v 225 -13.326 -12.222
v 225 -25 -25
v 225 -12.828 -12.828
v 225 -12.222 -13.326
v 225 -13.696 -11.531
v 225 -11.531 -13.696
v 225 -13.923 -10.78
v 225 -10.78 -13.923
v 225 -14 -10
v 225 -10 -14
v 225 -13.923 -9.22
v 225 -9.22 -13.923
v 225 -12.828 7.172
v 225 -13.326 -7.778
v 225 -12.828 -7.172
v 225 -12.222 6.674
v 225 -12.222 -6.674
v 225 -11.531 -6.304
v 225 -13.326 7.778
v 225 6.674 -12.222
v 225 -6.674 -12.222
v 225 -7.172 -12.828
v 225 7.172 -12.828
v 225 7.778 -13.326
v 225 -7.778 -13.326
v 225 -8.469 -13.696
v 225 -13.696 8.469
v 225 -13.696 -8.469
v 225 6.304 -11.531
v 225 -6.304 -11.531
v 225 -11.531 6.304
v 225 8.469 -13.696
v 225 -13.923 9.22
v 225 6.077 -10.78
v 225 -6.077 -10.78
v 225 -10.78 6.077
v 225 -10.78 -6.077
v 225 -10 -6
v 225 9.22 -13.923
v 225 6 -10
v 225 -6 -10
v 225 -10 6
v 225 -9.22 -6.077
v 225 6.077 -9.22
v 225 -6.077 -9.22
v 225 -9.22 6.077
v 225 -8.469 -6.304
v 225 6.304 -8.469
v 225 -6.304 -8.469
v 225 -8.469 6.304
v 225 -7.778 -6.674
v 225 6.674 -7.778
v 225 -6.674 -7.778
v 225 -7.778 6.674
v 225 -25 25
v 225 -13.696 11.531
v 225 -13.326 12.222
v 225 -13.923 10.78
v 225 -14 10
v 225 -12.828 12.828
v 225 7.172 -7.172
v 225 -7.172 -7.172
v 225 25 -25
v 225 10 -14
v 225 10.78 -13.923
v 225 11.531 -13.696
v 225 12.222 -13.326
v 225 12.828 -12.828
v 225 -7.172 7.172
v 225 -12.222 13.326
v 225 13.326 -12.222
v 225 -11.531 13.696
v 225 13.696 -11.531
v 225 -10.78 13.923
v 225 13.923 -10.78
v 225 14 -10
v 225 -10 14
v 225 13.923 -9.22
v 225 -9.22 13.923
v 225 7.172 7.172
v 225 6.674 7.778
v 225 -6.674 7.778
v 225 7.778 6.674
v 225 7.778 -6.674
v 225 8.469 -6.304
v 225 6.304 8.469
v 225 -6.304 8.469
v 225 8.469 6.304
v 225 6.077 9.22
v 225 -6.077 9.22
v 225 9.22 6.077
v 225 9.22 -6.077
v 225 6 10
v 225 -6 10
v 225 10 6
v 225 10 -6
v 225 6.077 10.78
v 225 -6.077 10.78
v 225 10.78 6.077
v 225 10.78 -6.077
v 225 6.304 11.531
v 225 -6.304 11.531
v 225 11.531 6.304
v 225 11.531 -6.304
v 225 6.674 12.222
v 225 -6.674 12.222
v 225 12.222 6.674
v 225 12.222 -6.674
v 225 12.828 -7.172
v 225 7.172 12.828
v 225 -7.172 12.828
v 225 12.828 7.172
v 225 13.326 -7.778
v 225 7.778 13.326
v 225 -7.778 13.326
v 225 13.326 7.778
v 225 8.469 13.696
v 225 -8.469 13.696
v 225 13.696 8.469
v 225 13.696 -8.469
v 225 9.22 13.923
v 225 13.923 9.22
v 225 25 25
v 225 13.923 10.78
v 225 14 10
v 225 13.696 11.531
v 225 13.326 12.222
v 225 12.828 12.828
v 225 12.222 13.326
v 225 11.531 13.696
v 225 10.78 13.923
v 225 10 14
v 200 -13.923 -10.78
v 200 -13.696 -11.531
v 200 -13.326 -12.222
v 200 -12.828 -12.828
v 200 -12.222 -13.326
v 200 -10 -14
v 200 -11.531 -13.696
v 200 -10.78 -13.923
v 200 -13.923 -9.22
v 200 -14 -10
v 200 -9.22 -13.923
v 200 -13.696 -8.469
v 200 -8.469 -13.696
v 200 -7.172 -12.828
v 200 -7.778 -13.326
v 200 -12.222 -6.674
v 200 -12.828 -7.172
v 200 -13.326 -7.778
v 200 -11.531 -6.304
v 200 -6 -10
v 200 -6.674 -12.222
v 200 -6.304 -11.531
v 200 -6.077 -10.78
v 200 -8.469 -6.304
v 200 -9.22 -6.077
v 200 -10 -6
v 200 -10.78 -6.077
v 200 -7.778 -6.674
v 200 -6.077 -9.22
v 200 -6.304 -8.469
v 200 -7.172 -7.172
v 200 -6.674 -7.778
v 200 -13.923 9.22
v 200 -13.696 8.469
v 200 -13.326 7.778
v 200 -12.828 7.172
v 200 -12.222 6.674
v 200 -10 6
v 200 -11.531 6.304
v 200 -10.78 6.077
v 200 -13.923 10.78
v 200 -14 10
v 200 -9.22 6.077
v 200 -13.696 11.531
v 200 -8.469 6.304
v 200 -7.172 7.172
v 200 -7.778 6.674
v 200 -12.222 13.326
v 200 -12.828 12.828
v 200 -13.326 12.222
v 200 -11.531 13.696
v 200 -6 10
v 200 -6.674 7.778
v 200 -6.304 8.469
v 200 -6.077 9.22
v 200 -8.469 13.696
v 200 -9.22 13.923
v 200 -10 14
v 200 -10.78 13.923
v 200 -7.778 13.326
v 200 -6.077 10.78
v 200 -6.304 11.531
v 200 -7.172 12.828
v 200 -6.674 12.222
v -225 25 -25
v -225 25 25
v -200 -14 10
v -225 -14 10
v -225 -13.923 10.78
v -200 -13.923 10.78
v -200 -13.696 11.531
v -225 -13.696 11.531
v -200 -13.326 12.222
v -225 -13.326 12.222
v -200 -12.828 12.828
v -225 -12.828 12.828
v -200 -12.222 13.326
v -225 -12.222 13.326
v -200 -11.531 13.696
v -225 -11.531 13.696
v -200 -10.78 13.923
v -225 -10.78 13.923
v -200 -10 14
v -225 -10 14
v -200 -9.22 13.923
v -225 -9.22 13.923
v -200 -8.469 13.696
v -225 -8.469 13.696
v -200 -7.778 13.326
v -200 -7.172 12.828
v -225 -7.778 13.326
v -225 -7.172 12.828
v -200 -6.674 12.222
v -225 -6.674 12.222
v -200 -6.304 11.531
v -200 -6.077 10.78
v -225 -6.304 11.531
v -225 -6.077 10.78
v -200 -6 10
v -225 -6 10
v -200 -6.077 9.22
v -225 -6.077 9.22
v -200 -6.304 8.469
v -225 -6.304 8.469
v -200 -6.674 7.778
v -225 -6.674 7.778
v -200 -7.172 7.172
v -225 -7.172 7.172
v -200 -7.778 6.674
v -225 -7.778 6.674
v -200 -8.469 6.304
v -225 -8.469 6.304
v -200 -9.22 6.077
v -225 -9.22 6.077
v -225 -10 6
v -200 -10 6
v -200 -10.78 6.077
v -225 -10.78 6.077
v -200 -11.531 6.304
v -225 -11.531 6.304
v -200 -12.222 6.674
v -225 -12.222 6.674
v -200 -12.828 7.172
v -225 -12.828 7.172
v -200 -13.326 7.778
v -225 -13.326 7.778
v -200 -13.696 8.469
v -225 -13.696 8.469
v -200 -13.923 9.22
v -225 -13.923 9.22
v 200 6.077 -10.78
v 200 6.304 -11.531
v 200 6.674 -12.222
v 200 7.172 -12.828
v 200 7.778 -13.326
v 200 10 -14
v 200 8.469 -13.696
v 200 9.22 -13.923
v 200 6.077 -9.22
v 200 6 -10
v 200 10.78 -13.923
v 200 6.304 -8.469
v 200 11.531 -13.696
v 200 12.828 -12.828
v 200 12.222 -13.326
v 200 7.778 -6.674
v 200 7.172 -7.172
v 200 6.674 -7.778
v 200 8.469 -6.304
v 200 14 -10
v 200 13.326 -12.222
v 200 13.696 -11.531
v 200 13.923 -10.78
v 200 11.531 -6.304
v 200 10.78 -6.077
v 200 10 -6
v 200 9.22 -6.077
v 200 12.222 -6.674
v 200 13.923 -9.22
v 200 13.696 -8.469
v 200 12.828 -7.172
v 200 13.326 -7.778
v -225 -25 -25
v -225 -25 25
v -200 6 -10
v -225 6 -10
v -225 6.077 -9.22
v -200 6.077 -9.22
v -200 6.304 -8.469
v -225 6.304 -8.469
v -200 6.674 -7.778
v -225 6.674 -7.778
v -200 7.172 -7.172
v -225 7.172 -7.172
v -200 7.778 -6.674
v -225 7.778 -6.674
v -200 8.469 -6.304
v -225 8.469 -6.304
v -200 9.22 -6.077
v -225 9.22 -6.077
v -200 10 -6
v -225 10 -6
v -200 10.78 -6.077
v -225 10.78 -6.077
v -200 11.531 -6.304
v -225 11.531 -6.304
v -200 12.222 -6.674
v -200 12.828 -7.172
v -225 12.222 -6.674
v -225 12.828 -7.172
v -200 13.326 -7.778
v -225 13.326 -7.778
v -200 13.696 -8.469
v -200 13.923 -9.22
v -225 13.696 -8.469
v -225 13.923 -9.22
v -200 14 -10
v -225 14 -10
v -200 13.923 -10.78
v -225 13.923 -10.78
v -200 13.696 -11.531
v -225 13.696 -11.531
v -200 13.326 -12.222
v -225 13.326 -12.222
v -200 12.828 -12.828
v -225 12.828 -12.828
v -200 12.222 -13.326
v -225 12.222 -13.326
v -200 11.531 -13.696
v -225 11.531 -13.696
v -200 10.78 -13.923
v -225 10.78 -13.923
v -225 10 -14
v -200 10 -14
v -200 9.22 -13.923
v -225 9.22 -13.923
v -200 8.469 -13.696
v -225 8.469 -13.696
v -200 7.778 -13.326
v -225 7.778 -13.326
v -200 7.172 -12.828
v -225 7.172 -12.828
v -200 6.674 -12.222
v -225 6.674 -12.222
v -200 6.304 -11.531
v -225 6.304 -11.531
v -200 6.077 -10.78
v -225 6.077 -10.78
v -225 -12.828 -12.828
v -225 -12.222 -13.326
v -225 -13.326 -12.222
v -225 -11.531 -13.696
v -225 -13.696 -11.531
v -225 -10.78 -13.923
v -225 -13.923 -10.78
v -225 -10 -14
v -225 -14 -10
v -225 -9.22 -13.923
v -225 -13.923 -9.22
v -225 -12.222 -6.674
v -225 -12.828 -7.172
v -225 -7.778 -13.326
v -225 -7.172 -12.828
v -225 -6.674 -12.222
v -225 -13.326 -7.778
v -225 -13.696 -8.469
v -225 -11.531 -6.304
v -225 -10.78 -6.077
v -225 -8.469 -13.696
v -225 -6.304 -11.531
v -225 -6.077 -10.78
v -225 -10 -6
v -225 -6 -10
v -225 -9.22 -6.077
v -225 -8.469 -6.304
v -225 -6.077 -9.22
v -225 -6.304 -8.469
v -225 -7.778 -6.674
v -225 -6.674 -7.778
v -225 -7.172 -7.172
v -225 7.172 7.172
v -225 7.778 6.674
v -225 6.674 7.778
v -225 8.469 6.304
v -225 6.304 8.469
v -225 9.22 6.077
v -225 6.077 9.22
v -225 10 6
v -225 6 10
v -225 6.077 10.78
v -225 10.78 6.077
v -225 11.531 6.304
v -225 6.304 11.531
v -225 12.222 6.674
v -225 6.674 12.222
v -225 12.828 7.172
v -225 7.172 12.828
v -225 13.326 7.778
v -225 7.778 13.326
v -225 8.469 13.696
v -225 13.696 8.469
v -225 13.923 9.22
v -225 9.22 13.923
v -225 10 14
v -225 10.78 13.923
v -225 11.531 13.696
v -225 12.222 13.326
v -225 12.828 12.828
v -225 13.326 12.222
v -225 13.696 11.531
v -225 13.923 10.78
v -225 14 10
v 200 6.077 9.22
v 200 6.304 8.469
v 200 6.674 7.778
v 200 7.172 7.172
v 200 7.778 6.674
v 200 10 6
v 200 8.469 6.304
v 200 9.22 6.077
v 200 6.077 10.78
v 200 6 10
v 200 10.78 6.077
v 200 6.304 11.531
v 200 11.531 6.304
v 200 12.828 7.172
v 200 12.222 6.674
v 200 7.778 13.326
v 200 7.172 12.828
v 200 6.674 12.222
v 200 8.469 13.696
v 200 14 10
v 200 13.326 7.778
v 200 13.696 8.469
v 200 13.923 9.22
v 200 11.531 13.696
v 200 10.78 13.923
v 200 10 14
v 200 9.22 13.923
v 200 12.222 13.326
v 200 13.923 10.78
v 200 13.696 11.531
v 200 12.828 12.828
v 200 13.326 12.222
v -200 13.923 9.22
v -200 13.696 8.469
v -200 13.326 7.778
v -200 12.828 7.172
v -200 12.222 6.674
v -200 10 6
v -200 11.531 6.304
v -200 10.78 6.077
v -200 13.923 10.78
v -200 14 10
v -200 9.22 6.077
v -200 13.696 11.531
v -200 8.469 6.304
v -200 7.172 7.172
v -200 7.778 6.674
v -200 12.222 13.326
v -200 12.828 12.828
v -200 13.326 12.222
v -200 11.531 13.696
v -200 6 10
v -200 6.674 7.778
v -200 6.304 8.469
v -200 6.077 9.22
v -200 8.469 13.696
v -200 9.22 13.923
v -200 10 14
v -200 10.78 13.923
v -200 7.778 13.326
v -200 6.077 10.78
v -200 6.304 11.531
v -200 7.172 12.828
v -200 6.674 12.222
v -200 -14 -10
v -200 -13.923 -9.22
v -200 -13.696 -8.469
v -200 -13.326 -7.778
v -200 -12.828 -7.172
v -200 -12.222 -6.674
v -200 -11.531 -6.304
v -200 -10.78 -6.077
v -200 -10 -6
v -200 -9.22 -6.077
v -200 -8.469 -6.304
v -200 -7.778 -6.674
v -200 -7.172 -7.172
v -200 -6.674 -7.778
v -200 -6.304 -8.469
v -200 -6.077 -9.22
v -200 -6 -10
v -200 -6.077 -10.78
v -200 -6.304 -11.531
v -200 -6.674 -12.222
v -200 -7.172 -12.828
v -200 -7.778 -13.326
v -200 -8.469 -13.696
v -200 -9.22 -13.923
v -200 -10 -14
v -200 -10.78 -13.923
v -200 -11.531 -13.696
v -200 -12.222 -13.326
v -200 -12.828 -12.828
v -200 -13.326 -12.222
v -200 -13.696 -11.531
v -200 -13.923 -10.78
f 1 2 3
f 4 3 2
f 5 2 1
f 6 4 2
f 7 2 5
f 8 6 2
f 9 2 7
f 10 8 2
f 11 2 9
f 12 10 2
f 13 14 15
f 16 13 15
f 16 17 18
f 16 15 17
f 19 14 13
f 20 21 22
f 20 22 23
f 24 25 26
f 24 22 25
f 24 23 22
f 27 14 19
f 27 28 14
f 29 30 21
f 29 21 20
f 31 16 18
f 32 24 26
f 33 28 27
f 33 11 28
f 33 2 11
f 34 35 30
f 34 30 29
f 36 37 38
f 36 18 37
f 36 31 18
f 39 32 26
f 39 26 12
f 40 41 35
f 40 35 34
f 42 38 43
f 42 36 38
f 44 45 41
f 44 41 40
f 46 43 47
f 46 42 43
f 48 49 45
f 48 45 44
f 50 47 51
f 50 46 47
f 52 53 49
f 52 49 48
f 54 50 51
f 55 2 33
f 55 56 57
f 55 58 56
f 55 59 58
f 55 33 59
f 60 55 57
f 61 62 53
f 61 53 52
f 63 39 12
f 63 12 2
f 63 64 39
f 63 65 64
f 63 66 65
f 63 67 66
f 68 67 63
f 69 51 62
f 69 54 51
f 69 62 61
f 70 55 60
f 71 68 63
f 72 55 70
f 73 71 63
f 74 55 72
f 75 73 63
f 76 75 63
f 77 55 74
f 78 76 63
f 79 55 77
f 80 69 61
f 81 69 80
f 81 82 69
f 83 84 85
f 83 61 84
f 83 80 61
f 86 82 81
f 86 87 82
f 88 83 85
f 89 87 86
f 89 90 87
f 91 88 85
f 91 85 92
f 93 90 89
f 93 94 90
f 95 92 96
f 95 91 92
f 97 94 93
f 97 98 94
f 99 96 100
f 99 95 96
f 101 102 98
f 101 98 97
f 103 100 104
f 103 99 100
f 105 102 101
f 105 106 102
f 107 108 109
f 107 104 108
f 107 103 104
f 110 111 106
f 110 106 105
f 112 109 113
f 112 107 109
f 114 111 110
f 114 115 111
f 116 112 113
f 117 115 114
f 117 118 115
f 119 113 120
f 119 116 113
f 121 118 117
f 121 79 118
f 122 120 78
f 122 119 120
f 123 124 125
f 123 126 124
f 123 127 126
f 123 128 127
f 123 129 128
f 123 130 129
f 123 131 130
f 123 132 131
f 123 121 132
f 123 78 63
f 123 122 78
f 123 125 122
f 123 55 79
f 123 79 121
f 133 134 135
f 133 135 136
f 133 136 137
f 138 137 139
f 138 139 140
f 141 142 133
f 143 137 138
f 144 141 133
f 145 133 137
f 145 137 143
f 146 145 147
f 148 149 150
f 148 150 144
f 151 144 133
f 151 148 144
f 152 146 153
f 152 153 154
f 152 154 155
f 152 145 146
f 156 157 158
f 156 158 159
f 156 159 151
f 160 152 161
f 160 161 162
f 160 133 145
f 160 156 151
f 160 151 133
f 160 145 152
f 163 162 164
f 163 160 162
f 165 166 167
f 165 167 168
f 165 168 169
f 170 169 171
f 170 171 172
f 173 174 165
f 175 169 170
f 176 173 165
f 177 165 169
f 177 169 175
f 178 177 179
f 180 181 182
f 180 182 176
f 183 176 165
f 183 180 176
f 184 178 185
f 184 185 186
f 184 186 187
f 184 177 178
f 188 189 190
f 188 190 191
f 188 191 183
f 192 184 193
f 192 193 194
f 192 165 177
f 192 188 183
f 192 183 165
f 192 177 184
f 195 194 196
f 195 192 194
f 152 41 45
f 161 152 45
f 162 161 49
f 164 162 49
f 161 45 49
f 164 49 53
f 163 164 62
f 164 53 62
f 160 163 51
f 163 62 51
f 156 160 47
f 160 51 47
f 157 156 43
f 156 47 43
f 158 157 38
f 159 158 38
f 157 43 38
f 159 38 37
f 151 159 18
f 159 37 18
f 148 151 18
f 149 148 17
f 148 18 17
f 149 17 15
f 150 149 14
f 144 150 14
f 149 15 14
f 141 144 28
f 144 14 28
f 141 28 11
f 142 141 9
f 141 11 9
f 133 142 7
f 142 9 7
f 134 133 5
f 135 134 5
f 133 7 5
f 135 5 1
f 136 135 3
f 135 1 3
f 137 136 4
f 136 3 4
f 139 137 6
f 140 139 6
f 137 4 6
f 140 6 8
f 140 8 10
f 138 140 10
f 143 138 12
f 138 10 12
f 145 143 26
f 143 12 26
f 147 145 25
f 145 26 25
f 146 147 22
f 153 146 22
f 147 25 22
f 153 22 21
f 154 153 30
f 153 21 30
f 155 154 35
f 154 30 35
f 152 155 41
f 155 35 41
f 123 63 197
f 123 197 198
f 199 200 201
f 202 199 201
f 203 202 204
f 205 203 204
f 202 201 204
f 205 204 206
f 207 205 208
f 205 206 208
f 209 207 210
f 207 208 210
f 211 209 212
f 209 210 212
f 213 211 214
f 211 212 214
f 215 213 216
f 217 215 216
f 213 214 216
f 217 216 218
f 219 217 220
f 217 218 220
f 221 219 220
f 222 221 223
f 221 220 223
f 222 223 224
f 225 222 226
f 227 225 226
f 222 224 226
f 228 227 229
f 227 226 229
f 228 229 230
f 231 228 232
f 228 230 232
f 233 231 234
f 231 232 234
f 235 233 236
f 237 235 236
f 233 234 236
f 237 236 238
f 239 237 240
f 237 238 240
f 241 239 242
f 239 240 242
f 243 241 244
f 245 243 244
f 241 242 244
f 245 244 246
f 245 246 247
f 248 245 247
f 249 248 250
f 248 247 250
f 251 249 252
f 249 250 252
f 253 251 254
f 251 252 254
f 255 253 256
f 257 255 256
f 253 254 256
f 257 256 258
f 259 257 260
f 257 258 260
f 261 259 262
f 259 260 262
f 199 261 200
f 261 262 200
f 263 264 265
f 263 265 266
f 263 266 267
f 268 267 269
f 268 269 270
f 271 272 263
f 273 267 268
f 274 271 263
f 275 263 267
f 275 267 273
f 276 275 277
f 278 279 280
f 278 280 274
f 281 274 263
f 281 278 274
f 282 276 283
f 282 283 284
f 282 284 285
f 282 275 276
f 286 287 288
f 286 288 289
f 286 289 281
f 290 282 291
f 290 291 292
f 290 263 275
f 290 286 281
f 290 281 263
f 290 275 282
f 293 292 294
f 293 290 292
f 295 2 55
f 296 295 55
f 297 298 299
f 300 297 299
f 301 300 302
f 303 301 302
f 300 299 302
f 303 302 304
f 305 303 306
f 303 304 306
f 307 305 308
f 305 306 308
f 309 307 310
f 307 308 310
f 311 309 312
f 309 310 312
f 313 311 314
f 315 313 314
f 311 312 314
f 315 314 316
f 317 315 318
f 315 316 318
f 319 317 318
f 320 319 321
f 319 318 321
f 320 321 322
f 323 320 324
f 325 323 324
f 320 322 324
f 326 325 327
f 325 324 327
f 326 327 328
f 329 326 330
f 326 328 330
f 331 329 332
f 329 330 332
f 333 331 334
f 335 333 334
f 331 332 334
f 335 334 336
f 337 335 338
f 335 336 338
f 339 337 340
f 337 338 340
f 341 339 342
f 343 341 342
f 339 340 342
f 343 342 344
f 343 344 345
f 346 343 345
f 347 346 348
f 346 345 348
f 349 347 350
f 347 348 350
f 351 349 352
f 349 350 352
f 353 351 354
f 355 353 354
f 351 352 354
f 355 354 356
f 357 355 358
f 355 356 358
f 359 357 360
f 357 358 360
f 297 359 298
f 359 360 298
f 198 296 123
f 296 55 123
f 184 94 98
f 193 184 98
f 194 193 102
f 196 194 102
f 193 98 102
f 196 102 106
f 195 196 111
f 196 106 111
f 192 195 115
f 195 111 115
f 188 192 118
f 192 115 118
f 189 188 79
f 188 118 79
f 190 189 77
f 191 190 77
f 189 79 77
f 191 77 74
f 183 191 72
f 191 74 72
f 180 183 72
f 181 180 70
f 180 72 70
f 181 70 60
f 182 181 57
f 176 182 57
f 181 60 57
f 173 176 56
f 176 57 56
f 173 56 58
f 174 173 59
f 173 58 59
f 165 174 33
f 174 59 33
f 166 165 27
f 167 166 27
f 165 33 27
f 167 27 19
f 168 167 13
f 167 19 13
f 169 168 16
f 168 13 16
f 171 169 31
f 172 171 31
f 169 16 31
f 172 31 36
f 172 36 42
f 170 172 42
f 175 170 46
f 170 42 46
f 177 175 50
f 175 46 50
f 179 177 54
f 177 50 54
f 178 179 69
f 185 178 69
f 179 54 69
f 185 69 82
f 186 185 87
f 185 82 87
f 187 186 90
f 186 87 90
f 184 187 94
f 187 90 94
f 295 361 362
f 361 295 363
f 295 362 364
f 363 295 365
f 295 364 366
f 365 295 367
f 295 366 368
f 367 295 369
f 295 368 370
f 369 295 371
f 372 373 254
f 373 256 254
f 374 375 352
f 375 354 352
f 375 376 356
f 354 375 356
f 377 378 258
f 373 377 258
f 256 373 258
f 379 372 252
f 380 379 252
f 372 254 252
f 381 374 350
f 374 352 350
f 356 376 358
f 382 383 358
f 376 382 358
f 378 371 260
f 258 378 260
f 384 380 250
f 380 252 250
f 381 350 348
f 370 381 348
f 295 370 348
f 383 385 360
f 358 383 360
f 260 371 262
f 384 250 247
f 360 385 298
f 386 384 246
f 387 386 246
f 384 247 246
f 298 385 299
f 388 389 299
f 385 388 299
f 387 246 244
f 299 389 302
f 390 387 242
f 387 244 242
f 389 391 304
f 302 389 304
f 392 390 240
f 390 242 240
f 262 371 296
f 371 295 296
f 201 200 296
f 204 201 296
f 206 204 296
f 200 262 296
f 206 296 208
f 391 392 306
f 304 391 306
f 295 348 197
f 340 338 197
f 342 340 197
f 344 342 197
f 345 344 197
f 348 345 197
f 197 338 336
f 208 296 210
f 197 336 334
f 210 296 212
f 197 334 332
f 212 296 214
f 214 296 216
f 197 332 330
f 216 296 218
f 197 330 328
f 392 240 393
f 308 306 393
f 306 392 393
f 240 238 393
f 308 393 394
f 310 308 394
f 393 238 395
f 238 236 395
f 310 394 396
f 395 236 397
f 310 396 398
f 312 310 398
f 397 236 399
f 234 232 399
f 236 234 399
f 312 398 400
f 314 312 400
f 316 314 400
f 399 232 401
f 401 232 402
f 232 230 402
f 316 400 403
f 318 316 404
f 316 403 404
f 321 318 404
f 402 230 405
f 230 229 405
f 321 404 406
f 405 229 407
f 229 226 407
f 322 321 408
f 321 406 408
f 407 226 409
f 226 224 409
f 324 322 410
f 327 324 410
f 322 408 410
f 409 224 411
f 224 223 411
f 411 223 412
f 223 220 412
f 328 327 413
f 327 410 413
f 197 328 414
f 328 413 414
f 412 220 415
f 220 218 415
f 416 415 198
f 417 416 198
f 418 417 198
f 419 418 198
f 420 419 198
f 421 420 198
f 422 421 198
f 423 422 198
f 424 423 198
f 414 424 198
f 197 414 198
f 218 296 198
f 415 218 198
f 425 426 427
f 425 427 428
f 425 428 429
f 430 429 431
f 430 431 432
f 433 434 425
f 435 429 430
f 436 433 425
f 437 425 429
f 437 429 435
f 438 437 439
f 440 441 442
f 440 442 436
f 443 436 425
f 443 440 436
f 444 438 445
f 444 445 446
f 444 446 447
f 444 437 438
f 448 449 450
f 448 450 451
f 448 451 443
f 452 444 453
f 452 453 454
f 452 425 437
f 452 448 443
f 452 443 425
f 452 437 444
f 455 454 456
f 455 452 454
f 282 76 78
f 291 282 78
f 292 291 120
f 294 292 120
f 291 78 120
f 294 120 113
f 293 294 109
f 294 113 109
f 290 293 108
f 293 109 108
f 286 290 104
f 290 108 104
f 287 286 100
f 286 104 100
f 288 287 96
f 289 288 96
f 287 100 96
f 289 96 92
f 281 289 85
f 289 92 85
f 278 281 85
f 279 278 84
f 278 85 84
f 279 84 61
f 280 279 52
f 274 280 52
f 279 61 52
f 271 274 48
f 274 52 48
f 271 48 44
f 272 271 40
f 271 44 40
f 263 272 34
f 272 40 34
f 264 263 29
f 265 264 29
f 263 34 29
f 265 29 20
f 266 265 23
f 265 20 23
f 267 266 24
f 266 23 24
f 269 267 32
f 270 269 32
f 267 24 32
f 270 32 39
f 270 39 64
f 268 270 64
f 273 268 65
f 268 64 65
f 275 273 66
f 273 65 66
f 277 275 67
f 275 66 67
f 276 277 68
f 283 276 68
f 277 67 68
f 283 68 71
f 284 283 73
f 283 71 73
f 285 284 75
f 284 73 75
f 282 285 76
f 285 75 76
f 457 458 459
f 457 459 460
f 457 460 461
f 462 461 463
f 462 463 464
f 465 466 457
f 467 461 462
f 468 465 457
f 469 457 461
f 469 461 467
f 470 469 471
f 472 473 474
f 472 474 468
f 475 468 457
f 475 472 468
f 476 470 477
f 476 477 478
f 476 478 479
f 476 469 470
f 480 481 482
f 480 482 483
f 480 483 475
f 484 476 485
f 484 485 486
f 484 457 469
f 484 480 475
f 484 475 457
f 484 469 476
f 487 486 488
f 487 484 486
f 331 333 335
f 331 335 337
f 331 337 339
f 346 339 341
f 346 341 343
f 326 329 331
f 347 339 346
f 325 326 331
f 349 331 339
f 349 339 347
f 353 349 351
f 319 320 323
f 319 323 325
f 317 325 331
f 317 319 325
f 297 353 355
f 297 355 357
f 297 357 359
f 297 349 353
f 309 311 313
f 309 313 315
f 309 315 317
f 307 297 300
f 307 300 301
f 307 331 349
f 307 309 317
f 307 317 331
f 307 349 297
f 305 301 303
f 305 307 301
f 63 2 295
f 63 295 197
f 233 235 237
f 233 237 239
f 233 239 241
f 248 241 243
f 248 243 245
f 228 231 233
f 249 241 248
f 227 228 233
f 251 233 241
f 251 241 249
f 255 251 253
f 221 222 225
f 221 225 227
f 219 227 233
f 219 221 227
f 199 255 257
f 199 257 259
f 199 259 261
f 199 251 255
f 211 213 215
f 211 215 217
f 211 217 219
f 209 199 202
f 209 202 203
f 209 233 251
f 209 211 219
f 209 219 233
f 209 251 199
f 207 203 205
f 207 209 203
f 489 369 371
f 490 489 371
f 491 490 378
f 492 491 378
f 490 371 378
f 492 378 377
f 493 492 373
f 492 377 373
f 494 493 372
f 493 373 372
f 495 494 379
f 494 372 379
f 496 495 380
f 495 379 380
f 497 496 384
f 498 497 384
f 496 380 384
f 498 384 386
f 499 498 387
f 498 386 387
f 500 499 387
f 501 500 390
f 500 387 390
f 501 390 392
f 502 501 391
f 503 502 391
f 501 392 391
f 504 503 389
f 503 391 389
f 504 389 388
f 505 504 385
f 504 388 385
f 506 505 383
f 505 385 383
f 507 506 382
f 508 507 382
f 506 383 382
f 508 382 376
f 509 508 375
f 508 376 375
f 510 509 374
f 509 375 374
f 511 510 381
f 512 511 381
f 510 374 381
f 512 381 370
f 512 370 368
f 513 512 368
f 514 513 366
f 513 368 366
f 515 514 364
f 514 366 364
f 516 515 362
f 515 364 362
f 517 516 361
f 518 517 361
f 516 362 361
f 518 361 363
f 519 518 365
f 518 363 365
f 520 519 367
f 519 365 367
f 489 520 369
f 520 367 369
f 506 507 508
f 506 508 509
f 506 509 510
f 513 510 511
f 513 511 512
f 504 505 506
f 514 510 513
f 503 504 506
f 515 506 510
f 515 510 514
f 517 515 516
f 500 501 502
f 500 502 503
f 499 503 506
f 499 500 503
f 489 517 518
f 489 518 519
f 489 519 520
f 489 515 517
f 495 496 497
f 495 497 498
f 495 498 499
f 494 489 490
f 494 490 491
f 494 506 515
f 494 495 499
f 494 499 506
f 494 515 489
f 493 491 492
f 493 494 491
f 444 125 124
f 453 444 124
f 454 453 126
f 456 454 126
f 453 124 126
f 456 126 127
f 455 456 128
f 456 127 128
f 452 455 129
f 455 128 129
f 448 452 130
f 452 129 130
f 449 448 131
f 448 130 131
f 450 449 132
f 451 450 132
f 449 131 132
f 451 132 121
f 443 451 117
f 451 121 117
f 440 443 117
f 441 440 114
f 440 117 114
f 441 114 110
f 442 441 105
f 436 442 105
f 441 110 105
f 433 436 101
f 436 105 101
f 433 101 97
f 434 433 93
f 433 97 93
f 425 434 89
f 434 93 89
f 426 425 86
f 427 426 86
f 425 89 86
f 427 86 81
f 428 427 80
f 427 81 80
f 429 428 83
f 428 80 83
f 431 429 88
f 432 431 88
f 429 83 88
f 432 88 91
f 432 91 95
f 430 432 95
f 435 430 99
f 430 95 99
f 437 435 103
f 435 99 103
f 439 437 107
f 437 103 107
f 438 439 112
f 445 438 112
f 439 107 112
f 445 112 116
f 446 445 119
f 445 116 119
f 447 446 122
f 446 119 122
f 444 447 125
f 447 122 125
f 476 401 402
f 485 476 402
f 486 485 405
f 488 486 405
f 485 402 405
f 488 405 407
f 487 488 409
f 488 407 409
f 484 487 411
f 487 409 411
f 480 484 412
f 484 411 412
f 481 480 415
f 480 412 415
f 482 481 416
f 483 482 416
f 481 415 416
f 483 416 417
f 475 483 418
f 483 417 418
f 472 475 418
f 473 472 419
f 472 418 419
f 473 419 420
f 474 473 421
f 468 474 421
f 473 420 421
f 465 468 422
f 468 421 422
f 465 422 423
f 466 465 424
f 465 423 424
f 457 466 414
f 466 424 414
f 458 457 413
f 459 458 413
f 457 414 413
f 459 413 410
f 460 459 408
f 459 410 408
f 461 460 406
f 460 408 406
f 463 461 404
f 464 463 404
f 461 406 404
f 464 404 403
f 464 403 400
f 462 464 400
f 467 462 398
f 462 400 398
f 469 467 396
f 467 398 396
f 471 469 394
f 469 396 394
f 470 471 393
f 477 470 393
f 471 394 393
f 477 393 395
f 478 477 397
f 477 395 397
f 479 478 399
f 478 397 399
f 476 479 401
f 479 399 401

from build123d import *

# Parameters (mm, degrees)
F0_W     = 50
F0_H     = 50
F1_DEPTH = 225
F2_R     = 4
F3_DEPTH = 25
F4_R     = 4
F5_DEPTH = 25


with BuildPart() as f1:
    # F0 (on Right) → F1 (new body, symmetric)
    with BuildSketch(Plane.YZ):
        Rectangle(F0_W, F0_H)
    extrude(amount=F1_DEPTH, both=True)

    # F2 (on face) → F3 (cut)
    with BuildSketch(Plane.YZ.offset(225)):
        with Locations((-10, 10)):
            Circle(F2_R)
        with Locations((10, 10)):
            Circle(F2_R)
        with Locations((10, -10)):
            Circle(F2_R)
        with Locations((-10, -10)):
            Circle(F2_R)
    extrude(amount=-F3_DEPTH, mode=Mode.SUBTRACT)

    # F4 (on face) → F5 (cut)
    with BuildSketch(Plane(origin=(-225, 0, 0), x_dir=(0, -1, 0), z_dir=(-1, 0, 0))):
        with Locations((-10, 10)):
            Circle(F4_R)
        with Locations((10, 10)):
            Circle(F4_R)
        with Locations((10, -10)):
            Circle(F4_R)
        with Locations((-10, -10)):
            Circle(F4_R)
    extrude(amount=-F5_DEPTH, mode=Mode.SUBTRACT)


solid = f1.part
